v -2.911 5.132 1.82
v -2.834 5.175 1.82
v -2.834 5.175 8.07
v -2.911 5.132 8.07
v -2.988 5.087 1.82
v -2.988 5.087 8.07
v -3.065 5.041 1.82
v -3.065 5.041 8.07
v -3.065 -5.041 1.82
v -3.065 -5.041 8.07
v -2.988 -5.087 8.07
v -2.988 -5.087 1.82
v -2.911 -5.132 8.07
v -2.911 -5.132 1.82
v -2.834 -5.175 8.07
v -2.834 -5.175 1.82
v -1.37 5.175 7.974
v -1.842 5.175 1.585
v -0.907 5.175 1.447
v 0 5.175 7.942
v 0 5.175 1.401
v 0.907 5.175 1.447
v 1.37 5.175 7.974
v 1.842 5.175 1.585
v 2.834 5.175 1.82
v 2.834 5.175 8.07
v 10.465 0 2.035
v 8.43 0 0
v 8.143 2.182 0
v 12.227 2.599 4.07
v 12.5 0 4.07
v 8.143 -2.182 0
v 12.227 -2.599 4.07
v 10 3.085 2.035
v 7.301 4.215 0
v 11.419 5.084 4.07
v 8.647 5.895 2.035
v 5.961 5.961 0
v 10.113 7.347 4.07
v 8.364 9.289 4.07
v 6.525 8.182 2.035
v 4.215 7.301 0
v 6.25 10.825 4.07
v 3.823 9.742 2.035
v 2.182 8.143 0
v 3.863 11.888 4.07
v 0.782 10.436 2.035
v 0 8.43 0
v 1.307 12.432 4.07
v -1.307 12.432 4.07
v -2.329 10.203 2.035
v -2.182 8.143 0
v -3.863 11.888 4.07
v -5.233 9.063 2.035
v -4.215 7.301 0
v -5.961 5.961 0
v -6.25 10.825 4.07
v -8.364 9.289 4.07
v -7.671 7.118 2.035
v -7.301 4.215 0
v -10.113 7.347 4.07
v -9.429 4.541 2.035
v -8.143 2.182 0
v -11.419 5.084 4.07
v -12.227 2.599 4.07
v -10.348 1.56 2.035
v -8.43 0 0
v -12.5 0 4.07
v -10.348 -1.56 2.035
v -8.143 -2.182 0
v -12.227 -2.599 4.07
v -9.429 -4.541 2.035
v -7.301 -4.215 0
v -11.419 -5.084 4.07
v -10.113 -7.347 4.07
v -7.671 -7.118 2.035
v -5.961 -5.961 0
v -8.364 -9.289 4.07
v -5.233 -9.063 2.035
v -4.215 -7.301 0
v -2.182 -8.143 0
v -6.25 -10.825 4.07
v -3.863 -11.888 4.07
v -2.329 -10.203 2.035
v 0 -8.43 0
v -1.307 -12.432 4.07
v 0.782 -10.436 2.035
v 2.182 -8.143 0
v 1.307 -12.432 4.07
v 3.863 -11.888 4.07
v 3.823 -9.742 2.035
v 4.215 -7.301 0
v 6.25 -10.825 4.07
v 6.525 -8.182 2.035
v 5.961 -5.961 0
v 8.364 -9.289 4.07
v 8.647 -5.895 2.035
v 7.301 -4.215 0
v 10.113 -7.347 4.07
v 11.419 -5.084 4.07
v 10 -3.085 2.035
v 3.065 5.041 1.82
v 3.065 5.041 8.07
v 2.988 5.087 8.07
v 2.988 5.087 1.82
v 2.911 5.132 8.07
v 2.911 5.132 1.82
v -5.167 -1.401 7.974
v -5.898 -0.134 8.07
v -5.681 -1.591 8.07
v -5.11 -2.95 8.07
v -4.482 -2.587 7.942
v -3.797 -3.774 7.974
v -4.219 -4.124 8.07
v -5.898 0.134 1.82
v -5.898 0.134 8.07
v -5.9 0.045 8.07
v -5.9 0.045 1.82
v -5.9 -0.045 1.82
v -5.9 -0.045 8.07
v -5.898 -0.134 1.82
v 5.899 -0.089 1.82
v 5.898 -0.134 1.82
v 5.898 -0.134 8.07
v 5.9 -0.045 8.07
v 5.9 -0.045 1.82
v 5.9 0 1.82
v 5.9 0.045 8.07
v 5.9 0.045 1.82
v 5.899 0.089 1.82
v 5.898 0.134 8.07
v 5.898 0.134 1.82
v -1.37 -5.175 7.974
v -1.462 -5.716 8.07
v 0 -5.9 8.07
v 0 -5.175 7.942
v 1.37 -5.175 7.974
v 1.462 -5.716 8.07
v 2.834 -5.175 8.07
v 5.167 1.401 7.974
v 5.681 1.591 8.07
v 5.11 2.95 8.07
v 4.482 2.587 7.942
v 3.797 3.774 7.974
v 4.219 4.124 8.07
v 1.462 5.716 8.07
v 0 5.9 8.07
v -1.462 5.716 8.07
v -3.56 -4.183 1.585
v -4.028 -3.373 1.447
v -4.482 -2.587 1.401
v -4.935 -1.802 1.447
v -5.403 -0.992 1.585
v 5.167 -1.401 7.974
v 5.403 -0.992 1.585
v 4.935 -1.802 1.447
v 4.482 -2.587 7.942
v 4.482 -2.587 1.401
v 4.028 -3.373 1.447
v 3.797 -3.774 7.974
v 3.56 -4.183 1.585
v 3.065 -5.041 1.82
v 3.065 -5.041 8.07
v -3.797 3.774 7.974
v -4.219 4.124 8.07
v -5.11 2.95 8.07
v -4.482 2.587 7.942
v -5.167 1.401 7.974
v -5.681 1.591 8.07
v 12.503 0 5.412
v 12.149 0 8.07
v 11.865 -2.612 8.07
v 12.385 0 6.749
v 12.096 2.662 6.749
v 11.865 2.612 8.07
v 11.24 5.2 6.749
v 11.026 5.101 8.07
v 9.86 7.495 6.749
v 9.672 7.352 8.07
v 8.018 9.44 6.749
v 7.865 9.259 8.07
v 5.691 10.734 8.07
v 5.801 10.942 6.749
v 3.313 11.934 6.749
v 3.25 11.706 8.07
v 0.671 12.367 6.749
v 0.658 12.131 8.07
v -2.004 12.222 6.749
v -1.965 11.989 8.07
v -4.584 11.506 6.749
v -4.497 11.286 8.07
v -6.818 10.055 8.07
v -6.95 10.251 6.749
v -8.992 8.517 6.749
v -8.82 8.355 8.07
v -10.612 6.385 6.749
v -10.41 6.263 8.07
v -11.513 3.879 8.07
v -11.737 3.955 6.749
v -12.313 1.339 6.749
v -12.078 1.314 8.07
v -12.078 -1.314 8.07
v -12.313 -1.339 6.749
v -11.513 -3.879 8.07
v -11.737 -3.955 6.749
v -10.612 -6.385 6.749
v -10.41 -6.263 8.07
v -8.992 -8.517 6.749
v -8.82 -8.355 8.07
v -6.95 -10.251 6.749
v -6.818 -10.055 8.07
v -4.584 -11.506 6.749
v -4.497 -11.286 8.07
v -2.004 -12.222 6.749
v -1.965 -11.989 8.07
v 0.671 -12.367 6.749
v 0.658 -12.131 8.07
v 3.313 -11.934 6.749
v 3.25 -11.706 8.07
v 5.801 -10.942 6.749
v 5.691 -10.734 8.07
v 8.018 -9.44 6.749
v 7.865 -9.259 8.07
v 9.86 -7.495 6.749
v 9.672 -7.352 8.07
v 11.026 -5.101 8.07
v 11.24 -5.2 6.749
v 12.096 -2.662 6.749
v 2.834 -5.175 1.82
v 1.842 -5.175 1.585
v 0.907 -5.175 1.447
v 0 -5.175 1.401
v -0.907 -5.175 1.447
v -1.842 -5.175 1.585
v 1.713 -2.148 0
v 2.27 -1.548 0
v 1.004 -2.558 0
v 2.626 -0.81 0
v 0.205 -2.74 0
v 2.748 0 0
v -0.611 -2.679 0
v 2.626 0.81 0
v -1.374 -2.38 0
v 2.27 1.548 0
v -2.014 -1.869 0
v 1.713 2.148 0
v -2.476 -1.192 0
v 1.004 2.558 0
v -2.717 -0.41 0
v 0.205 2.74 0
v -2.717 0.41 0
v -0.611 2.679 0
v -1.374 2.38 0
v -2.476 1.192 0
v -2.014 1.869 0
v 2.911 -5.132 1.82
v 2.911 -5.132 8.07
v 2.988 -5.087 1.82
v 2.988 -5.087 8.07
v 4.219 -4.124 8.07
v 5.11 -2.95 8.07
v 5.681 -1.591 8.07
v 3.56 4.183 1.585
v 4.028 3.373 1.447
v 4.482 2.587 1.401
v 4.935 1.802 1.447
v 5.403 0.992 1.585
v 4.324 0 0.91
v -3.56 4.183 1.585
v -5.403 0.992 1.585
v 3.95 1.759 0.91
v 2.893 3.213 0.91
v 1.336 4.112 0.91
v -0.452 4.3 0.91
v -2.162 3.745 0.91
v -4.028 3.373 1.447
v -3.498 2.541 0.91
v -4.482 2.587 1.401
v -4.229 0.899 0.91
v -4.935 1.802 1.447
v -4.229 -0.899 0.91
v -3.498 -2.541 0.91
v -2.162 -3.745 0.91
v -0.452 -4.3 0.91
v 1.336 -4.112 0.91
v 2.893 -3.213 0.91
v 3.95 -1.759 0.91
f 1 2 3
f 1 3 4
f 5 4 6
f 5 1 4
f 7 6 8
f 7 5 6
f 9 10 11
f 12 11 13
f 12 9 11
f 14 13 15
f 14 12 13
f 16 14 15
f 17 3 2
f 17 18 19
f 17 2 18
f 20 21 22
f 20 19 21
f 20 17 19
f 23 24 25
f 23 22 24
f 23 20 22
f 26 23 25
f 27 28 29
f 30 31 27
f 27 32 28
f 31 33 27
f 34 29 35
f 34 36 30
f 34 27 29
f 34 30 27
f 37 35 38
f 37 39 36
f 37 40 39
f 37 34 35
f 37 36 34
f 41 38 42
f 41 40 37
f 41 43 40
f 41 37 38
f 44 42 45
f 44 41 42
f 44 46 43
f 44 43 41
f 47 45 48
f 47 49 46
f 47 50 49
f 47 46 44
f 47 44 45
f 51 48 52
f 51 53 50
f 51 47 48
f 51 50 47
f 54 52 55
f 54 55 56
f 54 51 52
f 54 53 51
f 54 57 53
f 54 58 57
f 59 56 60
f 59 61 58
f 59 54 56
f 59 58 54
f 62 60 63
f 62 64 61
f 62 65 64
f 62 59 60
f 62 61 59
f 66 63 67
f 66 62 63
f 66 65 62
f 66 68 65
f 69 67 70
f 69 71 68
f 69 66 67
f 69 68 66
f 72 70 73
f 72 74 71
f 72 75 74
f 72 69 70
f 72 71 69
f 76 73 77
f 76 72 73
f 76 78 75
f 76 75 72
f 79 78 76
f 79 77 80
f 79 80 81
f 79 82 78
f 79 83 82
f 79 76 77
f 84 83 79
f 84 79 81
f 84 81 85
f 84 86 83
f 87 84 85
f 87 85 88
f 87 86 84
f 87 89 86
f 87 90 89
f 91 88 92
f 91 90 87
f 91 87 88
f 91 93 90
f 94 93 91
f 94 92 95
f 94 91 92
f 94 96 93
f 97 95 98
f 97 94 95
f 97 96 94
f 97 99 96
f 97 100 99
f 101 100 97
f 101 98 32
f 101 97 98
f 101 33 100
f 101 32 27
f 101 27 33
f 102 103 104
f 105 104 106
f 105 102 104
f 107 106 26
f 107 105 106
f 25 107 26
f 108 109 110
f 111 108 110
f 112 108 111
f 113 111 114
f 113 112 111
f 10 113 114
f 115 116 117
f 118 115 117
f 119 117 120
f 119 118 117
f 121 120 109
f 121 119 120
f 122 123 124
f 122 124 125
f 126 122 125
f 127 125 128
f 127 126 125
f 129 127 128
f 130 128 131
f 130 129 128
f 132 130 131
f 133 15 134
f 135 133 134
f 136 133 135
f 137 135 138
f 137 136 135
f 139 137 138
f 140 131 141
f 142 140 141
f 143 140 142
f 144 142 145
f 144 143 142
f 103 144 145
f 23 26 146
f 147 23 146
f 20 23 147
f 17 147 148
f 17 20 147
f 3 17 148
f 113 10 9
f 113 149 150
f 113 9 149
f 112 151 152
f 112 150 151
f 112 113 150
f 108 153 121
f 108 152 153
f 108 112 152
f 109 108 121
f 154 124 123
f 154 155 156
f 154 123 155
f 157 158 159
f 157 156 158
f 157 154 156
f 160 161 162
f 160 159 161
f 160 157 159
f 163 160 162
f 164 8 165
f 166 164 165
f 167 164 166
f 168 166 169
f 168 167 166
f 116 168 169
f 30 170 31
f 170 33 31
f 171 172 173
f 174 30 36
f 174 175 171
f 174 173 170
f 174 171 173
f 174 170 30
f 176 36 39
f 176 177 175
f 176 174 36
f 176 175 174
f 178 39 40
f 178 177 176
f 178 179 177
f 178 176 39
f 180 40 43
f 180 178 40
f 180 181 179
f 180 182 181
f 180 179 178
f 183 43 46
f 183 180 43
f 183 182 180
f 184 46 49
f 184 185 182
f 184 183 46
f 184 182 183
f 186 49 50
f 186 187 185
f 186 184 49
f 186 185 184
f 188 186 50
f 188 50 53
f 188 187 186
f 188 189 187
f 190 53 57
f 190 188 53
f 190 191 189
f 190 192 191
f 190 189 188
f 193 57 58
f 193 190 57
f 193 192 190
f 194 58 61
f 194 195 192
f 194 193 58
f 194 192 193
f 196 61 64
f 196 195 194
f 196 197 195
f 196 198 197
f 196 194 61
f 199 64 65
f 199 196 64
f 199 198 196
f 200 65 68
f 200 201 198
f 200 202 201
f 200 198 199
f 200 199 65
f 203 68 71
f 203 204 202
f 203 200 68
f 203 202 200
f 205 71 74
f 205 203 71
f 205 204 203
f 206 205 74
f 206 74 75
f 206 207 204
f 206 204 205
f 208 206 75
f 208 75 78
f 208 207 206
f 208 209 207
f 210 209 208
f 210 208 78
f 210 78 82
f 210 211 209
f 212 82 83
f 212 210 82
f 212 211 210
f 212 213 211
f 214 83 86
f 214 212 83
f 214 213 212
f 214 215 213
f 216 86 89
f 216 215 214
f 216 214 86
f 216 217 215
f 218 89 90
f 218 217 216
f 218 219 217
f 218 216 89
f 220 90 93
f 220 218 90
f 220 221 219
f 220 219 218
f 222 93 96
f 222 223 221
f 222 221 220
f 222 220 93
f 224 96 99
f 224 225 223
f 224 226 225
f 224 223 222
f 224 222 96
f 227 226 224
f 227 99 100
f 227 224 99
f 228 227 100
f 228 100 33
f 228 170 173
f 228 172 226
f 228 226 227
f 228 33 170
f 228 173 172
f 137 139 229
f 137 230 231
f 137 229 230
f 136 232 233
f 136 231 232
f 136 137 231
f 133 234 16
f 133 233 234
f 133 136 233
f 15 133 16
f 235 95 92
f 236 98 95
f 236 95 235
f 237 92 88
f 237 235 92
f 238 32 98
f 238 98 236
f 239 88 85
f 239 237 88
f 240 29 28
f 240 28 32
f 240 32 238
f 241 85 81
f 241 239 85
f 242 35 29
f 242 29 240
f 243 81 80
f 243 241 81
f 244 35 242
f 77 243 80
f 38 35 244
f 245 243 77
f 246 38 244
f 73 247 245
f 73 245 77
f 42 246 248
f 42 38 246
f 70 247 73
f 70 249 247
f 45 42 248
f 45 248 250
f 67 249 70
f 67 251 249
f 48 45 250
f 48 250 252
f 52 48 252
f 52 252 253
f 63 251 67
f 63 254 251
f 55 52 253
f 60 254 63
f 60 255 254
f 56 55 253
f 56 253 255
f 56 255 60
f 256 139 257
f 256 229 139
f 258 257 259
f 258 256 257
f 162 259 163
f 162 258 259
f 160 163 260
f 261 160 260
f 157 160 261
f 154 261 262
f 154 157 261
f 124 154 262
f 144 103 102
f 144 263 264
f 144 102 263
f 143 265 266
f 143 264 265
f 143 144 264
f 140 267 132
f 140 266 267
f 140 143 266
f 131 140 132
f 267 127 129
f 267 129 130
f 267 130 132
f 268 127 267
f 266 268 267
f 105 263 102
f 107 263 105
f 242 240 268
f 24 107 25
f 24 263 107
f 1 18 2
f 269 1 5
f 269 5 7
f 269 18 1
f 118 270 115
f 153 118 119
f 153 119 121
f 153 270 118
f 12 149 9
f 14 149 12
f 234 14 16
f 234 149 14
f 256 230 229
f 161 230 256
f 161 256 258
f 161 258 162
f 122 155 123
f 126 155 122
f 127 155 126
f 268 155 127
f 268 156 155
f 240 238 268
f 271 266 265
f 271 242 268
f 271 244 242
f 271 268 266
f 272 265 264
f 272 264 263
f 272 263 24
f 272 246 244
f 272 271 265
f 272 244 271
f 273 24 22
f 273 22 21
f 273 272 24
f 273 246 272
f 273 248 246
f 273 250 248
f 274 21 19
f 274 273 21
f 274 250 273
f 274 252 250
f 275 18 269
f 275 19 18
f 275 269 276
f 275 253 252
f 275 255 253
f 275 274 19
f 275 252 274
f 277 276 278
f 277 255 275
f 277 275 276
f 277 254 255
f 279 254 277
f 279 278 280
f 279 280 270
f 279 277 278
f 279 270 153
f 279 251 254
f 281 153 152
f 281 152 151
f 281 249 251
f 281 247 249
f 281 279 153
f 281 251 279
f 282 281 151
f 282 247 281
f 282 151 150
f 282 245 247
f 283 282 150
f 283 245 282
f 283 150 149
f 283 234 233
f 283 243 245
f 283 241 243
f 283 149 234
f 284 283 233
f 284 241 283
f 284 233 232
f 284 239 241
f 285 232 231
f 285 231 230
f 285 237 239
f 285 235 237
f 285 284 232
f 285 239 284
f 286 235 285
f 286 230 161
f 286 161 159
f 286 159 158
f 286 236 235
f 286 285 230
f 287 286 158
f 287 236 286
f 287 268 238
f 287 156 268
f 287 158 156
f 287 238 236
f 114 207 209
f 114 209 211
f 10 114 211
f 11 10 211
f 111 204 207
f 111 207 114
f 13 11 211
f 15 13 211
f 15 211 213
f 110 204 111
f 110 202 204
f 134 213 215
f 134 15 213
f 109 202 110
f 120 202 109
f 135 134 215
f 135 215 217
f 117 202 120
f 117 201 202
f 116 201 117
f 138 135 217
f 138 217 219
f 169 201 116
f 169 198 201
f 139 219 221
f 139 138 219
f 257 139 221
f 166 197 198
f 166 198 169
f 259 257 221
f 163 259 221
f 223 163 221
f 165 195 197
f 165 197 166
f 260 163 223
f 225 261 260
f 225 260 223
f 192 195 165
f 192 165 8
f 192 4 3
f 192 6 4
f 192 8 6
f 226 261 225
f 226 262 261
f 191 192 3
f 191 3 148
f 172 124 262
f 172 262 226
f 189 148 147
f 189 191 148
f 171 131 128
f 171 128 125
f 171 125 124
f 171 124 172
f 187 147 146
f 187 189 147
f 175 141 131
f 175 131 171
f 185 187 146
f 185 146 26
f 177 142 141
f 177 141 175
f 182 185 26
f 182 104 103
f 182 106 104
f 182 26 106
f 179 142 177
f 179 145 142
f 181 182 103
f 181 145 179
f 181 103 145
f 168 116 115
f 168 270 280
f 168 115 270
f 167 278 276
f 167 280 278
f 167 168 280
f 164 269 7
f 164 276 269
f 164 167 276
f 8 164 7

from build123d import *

# Parameters (mm, degrees)
F2_R     = 6.7823339415
F3_DEPTH = 8.07
F4_R     = 5.9
F5_DEPTH = 1
F5_TAPER = 80


# Not quite as in the source:
# - an extrude ends at something that could not be found from the text; its depth is read off the source's solid


with BuildPart() as f1:
    # F0 (on Front) → F1 (revolve)
    with BuildSketch(Plane.XZ):
        with BuildLine():
            Line((12.1487583965, 8.07), (5.9, 8.07))
            Line((5.9, 8.07), (5.9, 1.82))
            Line((5.9, 1.82), (2.7476675302, 0))
            Line((2.7476675302, 0), (8.43, 0))
            Line((8.43, 0), (12.5, 4.07))
            ThreePointArc((12.5, 4.07), (12.4588304791, 6.0818062209), (12.1487583965, 8.07))
        make_face()
    revolve(axis=Axis((0, 0, -0.4323393759), (0, 0, 1)))

    # F2 (on face) → F3 (join, through all)
    with BuildSketch(Plane.XY.offset(8.07)):
        Circle(F2_R)
        Polygon((-5.9755752861, 0), (-2.9877876431, 5.175), (2.9877876431, 5.175), (5.9755752861, 0), (2.9877876431, -5.175), (-2.9877876431, -5.175), align=None, mode=Mode.SUBTRACT)
    extrude(amount=-F3_DEPTH)

    # F4 (on face) → F5 (cut)
    with BuildSketch(Plane.XY.offset(8.07)):
        Circle(F4_R)
    extrude(amount=-F5_DEPTH, taper=F5_TAPER, mode=Mode.SUBTRACT)


solid = f1.part
